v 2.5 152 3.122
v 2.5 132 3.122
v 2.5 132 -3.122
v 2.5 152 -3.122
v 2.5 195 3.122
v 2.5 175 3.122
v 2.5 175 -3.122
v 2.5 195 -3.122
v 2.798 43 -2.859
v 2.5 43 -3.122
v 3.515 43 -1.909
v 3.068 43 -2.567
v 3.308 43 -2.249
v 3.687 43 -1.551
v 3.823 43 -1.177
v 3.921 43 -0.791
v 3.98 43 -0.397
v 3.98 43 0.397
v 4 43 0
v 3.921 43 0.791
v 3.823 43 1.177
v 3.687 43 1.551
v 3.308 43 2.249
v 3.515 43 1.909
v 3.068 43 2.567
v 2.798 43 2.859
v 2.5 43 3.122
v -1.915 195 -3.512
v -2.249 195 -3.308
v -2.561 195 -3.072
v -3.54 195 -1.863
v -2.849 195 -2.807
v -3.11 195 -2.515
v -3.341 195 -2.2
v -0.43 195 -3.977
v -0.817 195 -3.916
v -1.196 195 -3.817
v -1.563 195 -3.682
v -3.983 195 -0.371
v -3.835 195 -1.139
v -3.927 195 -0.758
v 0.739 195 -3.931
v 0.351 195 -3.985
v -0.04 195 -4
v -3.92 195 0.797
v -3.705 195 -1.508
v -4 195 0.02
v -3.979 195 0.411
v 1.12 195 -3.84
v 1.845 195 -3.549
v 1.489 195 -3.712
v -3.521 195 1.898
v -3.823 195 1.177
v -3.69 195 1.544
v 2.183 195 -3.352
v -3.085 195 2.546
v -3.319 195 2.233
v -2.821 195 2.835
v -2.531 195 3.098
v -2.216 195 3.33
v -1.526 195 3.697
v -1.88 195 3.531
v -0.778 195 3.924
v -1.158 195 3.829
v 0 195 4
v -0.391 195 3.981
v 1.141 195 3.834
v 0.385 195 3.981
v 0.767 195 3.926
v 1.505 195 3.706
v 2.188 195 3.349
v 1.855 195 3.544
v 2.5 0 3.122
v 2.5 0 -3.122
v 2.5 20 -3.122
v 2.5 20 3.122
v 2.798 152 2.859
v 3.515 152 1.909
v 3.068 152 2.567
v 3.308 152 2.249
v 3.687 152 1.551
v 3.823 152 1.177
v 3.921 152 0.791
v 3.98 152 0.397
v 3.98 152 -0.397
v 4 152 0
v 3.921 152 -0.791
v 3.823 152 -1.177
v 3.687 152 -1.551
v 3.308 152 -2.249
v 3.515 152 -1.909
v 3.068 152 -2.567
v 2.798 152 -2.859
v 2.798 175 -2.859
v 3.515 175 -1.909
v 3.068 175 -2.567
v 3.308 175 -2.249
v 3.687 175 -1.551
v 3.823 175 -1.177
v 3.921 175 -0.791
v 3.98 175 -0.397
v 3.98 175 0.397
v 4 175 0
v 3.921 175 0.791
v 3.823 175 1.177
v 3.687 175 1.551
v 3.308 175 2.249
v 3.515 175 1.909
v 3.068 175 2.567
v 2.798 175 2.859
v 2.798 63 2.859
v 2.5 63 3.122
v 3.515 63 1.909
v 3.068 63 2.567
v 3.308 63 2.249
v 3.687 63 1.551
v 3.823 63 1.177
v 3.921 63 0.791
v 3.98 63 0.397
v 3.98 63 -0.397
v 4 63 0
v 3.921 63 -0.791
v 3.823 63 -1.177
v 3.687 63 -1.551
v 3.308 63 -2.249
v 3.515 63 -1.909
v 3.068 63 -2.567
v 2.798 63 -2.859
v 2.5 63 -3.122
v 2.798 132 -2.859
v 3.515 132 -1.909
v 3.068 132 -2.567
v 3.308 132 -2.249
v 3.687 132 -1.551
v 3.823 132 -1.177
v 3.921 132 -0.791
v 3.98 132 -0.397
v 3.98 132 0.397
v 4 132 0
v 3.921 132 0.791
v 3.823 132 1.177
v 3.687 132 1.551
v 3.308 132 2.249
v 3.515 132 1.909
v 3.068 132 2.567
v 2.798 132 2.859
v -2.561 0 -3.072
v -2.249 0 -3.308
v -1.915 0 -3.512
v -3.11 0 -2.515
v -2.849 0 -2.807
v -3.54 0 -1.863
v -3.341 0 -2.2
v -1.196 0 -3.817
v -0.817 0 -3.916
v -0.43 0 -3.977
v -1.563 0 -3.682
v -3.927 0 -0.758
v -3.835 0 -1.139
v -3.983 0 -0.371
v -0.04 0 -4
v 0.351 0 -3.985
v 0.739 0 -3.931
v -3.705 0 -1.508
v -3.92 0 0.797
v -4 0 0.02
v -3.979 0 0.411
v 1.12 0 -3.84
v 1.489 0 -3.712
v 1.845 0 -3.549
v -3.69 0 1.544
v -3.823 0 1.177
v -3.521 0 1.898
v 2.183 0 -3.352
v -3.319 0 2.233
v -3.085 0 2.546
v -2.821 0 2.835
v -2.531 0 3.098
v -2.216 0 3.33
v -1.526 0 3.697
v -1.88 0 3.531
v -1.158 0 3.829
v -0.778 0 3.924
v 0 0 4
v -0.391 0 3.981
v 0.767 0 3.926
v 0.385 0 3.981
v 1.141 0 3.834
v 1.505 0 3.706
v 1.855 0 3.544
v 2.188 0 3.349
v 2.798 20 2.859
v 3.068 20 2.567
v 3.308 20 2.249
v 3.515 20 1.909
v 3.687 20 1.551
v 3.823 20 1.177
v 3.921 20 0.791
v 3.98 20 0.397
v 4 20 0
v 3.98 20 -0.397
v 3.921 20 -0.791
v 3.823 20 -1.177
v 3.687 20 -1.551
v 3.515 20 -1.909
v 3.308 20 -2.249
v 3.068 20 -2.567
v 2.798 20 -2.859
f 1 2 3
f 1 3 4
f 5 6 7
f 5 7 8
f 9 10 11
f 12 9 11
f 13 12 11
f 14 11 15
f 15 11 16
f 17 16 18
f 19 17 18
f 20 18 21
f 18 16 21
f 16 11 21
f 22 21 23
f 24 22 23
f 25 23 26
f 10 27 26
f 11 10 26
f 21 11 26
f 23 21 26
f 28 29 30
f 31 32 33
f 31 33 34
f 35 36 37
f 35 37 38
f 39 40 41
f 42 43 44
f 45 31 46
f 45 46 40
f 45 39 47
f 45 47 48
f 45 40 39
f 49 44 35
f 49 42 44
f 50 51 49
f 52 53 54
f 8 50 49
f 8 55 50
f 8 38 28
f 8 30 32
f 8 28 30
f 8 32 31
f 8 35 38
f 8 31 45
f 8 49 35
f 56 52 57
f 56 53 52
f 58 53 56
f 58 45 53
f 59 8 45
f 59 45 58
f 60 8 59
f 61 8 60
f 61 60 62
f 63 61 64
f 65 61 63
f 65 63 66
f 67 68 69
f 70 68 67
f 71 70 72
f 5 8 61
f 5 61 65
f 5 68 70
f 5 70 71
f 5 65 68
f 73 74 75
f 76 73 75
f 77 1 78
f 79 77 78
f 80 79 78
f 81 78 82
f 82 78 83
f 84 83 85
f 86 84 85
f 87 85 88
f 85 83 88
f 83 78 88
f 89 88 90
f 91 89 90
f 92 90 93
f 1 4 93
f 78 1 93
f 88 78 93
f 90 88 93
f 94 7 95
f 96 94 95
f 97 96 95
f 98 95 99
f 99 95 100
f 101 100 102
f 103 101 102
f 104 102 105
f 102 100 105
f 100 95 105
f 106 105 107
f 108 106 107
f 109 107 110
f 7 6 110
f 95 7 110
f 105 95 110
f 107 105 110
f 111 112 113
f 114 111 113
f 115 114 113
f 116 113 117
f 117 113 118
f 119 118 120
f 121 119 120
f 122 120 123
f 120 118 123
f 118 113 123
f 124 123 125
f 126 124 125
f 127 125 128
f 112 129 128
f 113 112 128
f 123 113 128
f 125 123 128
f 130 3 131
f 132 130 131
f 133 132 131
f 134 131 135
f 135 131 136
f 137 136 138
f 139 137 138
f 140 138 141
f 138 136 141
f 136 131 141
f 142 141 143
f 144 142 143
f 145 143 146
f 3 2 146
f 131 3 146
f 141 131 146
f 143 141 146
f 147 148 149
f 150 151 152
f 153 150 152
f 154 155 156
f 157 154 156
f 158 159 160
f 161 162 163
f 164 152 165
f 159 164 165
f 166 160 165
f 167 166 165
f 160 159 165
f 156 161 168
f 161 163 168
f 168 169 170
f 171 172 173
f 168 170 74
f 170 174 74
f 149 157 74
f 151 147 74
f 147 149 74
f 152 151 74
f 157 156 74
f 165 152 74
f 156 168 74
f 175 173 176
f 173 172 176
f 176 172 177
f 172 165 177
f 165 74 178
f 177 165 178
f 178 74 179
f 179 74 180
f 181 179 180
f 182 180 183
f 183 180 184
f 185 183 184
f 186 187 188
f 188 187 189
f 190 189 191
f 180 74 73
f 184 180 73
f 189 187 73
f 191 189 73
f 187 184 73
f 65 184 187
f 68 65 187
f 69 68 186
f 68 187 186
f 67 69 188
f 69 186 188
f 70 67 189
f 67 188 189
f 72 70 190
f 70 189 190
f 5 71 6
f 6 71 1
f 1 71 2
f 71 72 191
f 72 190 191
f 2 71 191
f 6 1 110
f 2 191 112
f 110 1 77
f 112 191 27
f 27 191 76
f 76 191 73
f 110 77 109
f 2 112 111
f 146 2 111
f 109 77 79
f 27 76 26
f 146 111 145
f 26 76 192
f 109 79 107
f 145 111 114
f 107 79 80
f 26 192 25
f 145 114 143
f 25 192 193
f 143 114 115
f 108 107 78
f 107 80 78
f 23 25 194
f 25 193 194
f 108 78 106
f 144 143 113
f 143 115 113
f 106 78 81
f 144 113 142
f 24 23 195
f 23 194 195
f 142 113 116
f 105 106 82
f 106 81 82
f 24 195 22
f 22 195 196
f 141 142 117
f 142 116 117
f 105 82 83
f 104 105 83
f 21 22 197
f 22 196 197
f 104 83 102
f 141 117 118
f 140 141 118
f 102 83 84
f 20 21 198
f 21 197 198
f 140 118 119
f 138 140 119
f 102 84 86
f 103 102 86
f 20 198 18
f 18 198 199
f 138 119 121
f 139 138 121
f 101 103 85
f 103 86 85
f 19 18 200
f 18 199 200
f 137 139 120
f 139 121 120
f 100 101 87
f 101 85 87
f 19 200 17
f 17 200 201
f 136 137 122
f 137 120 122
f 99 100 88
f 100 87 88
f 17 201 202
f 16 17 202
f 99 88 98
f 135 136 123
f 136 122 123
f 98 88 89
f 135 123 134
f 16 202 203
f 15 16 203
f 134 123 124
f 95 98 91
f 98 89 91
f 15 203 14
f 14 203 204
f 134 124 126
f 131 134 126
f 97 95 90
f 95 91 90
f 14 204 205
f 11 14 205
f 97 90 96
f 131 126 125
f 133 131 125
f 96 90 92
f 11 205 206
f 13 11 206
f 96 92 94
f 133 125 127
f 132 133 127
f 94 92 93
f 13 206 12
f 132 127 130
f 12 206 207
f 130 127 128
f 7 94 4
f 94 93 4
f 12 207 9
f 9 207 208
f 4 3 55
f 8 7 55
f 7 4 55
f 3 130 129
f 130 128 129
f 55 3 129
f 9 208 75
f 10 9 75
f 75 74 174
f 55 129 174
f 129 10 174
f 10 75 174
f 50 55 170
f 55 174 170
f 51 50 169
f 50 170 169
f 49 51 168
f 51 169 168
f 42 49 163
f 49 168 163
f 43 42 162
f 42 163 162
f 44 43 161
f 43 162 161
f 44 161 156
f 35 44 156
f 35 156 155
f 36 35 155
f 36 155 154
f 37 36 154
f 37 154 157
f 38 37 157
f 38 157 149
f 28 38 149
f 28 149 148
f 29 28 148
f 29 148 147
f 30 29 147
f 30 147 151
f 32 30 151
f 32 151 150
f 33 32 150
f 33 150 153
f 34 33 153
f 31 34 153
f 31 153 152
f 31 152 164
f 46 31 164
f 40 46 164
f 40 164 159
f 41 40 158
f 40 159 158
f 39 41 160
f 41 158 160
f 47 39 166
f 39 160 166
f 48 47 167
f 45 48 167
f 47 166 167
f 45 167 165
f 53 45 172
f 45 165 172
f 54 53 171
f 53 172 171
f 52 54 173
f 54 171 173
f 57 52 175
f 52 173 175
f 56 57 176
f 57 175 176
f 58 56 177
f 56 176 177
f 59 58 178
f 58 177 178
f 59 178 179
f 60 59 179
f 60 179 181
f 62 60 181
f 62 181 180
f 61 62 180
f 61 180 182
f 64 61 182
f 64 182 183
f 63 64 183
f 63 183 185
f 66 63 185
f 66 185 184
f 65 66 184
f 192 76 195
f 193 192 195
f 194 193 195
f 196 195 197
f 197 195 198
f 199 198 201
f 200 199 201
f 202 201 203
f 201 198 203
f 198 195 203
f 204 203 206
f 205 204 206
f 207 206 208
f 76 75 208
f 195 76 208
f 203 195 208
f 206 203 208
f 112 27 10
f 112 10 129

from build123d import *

# Parameters (mm, degrees)
SKETCH1_R                           = 4
BOSS_EXTRUDE1_DEPTH                 = 195
CUT_EXTRUDE1_REACH                  = 197.082
CUT_EXTRUDE1_END_RADIUS             = 4
SKETCH2_W                           = 1.5
SKETCH2_H                           = 20
CUT_EXTRUDE1_DIRECTION_2_REACH      = 197.082
CUT_EXTRUDE1_DIRECTION_2_END_RADIUS = 4


with BuildPart() as part:
    # Sketch1 → Boss-Extrude1 (new body)
    with BuildSketch(Plane(origin=(0, 0, 0), x_dir=(1, 0, 0), z_dir=(0, 1, 0))):
        with Locations(Location((0, 0, 0), (0, 0, 270))):
            Circle(SKETCH1_R)
    extrude(amount=BOSS_EXTRUDE1_DEPTH)

    # Cut-Extrude1: up to this cylinder (the profile starts inside it)
    cut_extrude1_end = Plane(origin=(0, 97.5, 0), z_dir=(0, -1, 0)) * Cylinder(CUT_EXTRUDE1_END_RADIUS, 578.164, mode=Mode.PRIVATE)
    # Sketch2 → Cut-Extrude1 (cut, up to the surface)
    with BuildSketch(Plane.XY, mode=Mode.PRIVATE) as cut_extrude1_sk1:
        with Locations((3.25, 185)):
            Rectangle(SKETCH2_W, SKETCH2_H)
    cut_extrude1_tool1 = extrude(cut_extrude1_sk1.sketch, amount=-CUT_EXTRUDE1_REACH, mode=Mode.PRIVATE) & cut_extrude1_end
    add(cut_extrude1_tool1.solids().sort_by_distance((3.25, 185, 0))[0], mode=Mode.SUBTRACT)
    # Sketch2 → Cut-Extrude1 (cut, up to the surface)
    with BuildSketch(Plane.XY, mode=Mode.PRIVATE) as cut_extrude1_sk2:
        with Locations((3.25, 142)):
            Rectangle(SKETCH2_W, SKETCH2_H)
    cut_extrude1_tool2 = extrude(cut_extrude1_sk2.sketch, amount=-CUT_EXTRUDE1_REACH, mode=Mode.PRIVATE) & cut_extrude1_end
    add(cut_extrude1_tool2.solids().sort_by_distance((3.25, 142, 0))[0], mode=Mode.SUBTRACT)
    # Sketch2 → Cut-Extrude1 (cut, up to the surface)
    with BuildSketch(Plane.XY, mode=Mode.PRIVATE) as cut_extrude1_sk3:
        with Locations((3.25, 53)):
            Rectangle(SKETCH2_W, SKETCH2_H)
    cut_extrude1_tool3 = extrude(cut_extrude1_sk3.sketch, amount=-CUT_EXTRUDE1_REACH, mode=Mode.PRIVATE) & cut_extrude1_end
    add(cut_extrude1_tool3.solids().sort_by_distance((3.25, 53, 0))[0], mode=Mode.SUBTRACT)
    # Sketch2 → Cut-Extrude1 (cut, up to the surface)
    with BuildSketch(Plane.XY, mode=Mode.PRIVATE) as cut_extrude1_sk4:
        with Locations((3.25, 10)):
            Rectangle(SKETCH2_W, SKETCH2_H)
    cut_extrude1_tool4 = extrude(cut_extrude1_sk4.sketch, amount=-CUT_EXTRUDE1_REACH, mode=Mode.PRIVATE) & cut_extrude1_end
    add(cut_extrude1_tool4.solids().sort_by_distance((3.25, 10, 0))[0], mode=Mode.SUBTRACT)

    # Cut-Extrude1 direction 2: up to this cylinder (the profile starts inside it)
    cut_extrude1_direction_2_end = Plane(origin=(0, 97.5, 0), z_dir=(0, -1, 0)) * Cylinder(CUT_EXTRUDE1_DIRECTION_2_END_RADIUS, 578.164, mode=Mode.PRIVATE)
    # Sketch2 → Cut-Extrude1 direction 2 (cut, up to the surface)
    with BuildSketch(Plane.XY, mode=Mode.PRIVATE) as cut_extrude1_direction_2_sk1:
        with Locations((3.25, 185)):
            Rectangle(SKETCH2_W, SKETCH2_H)
    cut_extrude1_direction_2_tool1 = extrude(cut_extrude1_direction_2_sk1.sketch, amount=CUT_EXTRUDE1_DIRECTION_2_REACH, mode=Mode.PRIVATE) & cut_extrude1_direction_2_end
    add(cut_extrude1_direction_2_tool1.solids().sort_by_distance((3.25, 185, 0))[0], mode=Mode.SUBTRACT)
    # Sketch2 → Cut-Extrude1 direction 2 (cut, up to the surface)
    with BuildSketch(Plane.XY, mode=Mode.PRIVATE) as cut_extrude1_direction_2_sk2:
        with Locations((3.25, 142)):
            Rectangle(SKETCH2_W, SKETCH2_H)
    cut_extrude1_direction_2_tool2 = extrude(cut_extrude1_direction_2_sk2.sketch, amount=CUT_EXTRUDE1_DIRECTION_2_REACH, mode=Mode.PRIVATE) & cut_extrude1_direction_2_end
    add(cut_extrude1_direction_2_tool2.solids().sort_by_distance((3.25, 142, 0))[0], mode=Mode.SUBTRACT)
    # Sketch2 → Cut-Extrude1 direction 2 (cut, up to the surface)
    with BuildSketch(Plane.XY, mode=Mode.PRIVATE) as cut_extrude1_direction_2_sk3:
        with Locations((3.25, 53)):
            Rectangle(SKETCH2_W, SKETCH2_H)
    cut_extrude1_direction_2_tool3 = extrude(cut_extrude1_direction_2_sk3.sketch, amount=CUT_EXTRUDE1_DIRECTION_2_REACH, mode=Mode.PRIVATE) & cut_extrude1_direction_2_end
    add(cut_extrude1_direction_2_tool3.solids().sort_by_distance((3.25, 53, 0))[0], mode=Mode.SUBTRACT)
    # Sketch2 → Cut-Extrude1 direction 2 (cut, up to the surface)
    with BuildSketch(Plane.XY, mode=Mode.PRIVATE) as cut_extrude1_direction_2_sk4:
        with Locations((3.25, 10)):
            Rectangle(SKETCH2_W, SKETCH2_H)
    cut_extrude1_direction_2_tool4 = extrude(cut_extrude1_direction_2_sk4.sketch, amount=CUT_EXTRUDE1_DIRECTION_2_REACH, mode=Mode.PRIVATE) & cut_extrude1_direction_2_end
    add(cut_extrude1_direction_2_tool4.solids().sort_by_distance((3.25, 10, 0))[0], mode=Mode.SUBTRACT)


solid = part.part
